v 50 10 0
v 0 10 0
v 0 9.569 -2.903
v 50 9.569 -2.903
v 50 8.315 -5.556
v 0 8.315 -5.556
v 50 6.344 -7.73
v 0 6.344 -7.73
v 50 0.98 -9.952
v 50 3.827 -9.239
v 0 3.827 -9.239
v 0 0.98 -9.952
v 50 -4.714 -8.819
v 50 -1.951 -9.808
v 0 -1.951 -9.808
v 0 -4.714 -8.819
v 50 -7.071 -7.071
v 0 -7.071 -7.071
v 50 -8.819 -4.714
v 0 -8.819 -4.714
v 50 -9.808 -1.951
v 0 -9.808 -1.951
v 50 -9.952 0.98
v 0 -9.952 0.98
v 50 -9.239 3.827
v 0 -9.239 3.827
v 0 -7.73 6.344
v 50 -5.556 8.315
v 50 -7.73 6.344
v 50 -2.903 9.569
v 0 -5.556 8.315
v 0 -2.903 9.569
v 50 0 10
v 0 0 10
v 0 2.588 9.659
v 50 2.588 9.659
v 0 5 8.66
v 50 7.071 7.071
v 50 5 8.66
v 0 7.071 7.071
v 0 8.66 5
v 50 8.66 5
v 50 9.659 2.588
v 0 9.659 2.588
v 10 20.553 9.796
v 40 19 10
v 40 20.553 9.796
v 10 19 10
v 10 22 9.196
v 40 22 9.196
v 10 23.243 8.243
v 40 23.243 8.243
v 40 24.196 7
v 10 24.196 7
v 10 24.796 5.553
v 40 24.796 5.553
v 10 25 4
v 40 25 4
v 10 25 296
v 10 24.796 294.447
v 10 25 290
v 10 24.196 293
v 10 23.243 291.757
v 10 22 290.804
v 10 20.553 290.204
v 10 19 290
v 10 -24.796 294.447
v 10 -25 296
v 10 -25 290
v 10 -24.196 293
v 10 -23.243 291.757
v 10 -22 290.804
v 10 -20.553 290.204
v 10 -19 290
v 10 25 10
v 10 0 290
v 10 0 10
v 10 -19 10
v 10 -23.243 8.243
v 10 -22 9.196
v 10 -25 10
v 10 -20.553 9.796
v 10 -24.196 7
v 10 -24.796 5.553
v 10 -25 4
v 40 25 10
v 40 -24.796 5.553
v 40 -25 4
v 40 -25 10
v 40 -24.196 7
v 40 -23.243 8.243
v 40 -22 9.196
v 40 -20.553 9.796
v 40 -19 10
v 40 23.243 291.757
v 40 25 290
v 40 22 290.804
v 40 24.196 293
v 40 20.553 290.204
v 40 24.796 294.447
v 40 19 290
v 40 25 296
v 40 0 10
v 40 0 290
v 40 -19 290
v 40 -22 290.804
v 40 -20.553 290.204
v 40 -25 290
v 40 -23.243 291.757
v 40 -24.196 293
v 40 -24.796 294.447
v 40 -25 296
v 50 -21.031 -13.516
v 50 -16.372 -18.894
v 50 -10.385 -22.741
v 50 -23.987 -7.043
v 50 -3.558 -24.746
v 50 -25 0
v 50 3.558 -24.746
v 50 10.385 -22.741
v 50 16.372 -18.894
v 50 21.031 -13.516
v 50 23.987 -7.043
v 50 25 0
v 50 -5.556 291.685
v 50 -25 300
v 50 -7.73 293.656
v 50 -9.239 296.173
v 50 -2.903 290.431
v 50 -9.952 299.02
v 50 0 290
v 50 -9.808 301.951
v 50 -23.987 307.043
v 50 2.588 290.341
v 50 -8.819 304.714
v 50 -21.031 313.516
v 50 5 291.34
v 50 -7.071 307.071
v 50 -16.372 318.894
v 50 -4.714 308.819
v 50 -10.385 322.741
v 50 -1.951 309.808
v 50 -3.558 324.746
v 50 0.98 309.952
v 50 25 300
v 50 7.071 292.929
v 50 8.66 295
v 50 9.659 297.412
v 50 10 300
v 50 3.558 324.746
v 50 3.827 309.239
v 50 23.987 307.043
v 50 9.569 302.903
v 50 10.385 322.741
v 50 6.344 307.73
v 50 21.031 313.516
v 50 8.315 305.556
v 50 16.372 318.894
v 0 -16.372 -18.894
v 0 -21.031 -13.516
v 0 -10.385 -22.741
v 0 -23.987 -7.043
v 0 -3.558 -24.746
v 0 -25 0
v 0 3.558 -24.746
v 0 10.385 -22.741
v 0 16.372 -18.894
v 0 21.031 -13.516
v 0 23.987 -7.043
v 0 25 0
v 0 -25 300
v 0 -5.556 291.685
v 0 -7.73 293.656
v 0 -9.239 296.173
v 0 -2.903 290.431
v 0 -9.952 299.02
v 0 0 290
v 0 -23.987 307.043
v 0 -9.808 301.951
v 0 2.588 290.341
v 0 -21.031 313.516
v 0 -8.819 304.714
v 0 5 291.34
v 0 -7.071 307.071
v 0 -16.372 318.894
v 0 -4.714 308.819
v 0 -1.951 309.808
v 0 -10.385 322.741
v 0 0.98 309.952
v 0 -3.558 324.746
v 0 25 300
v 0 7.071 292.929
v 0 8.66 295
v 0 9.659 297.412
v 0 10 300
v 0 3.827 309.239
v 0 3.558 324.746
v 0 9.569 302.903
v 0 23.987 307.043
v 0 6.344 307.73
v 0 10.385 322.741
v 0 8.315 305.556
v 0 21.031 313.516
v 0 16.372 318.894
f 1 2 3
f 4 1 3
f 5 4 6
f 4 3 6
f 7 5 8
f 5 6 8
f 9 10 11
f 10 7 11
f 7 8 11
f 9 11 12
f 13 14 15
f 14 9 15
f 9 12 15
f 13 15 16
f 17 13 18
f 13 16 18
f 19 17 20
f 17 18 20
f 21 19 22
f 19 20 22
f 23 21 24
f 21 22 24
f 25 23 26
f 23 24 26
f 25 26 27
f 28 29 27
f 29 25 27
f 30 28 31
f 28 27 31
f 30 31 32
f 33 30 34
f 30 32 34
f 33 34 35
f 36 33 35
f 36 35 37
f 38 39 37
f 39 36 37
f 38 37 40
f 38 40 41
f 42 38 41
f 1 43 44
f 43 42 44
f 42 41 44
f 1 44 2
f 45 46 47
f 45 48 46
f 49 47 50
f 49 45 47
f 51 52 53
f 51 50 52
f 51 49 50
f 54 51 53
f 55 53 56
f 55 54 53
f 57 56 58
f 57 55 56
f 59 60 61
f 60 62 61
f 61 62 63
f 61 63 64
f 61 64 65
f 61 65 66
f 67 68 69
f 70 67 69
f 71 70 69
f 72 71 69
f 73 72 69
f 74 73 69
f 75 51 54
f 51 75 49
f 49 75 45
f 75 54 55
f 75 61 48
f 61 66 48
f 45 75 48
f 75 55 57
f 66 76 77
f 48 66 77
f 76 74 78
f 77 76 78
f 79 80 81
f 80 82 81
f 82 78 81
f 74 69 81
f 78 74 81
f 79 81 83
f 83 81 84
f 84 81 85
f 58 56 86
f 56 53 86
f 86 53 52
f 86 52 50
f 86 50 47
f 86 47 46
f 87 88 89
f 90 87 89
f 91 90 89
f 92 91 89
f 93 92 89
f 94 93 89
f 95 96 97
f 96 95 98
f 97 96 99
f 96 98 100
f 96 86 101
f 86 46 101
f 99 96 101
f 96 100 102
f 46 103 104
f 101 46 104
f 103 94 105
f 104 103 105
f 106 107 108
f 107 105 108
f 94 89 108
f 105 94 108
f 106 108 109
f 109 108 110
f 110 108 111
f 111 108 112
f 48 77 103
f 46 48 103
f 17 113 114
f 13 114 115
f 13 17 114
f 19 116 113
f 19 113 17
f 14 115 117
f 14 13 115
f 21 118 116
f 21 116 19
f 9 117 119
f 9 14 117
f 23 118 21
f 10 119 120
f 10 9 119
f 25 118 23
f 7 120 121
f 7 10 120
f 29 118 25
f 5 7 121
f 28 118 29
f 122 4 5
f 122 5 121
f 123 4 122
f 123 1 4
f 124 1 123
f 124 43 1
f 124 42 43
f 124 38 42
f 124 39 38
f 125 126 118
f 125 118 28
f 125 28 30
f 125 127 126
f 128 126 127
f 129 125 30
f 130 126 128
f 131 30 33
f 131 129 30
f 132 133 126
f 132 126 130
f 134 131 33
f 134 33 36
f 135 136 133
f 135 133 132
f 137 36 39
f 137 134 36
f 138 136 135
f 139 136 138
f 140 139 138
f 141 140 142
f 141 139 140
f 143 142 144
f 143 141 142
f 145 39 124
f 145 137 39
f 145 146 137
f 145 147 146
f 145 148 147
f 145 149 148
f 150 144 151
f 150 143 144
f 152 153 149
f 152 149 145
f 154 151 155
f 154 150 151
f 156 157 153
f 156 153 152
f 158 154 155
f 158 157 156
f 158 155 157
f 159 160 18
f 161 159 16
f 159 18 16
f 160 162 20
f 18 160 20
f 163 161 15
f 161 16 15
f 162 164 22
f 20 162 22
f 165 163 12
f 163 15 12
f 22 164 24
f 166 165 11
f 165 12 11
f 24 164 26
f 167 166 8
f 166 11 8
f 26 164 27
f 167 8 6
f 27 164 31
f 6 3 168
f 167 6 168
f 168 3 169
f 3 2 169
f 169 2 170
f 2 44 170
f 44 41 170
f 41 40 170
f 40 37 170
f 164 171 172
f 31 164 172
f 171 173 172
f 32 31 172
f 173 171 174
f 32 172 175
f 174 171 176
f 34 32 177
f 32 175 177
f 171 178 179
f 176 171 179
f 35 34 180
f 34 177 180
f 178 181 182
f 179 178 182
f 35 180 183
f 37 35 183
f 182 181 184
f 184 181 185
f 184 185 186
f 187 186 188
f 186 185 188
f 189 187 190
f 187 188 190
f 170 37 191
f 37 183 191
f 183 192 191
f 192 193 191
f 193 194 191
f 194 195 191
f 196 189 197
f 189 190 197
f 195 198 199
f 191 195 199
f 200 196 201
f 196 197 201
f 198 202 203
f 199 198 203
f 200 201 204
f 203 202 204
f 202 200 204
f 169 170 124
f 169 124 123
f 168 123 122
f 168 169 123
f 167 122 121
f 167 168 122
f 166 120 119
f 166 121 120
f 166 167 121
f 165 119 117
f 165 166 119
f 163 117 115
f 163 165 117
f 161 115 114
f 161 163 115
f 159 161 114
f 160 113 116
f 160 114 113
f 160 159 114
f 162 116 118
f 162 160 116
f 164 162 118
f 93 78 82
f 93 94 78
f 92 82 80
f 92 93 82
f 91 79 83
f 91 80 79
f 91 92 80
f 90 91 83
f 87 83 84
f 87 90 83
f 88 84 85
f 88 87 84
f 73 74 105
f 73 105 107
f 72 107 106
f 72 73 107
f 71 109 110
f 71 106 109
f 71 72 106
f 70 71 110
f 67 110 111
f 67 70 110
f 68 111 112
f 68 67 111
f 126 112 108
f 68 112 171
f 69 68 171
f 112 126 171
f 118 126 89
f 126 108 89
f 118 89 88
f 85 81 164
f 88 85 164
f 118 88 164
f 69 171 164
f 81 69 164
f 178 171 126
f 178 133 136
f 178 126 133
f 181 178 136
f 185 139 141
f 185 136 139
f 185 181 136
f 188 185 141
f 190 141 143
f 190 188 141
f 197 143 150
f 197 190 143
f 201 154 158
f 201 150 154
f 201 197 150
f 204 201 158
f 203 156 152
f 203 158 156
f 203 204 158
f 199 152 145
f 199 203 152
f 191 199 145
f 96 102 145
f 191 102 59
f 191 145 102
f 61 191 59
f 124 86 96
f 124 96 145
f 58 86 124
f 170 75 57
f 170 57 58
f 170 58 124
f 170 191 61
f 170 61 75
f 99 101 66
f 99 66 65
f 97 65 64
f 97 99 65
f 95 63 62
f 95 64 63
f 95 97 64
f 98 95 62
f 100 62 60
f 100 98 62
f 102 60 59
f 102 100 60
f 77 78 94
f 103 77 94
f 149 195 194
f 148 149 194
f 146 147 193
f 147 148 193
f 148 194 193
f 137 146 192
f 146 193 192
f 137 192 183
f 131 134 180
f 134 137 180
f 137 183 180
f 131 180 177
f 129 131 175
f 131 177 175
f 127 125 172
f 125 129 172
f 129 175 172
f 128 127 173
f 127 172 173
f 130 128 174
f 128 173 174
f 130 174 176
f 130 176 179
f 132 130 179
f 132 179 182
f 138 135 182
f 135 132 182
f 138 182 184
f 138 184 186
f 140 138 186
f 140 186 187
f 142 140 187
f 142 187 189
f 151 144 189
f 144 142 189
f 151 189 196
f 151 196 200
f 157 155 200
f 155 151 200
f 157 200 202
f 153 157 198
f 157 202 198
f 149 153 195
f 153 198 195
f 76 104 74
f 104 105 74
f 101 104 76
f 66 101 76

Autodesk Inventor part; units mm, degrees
ref_plane "YZ Plane" through (0, 0, 0) normal (1, 0, 0) x (0, 1, 0)
ref_plane "XZ Plane" through (0, 0, 0) normal (0, 1, 0) x (-1, 0, 0)
ref_plane "XY Plane" through (0, 0, 0) normal (0, 0, 1) x (1, 0, 0)
sketch "Sketch1" plane through (0, 0, 0) normal (1, 0, 0) x (0, 1, 0)
  circle A0 centre (0, 0) radius 25
  line L0 (0, 0) -> (0, 300)
  circle A1 centre (0, 300) radius 25
  circle A2 centre (0, 300) radius 10
  circle A3 centre (0, 0) radius 10
  line L1 (25, 300) -> (25, 0)
  line L2 (-25, 300) -> (-25, 0)
  dimension "d0" = 300
  dimension "d1" = 50
  dimension "d2" = 20
extrude "Extrusion1" add sketch "Sketch1" along normal blind 50
sketch "Sketch2" plane through (0, -25, 0) normal (0, -1, 0) x (1, 0, 0)
  line L0 (0, 0) -> (50, 0) projected
  line L1 (50, 300) -> (50, 0) projected
  line L2 (0, 0) -> (50, 0)
  line L3 (50, 0) -> (50, 300)
  line L4 (50, 300) -> (0, 300)
  line L5 (0, 300) -> (0, 0)
  line L6 (10, 10) -> (40, 10)
  line L7 (40, 10) -> (40, 290)
  line L8 (40, 290) -> (10, 290)
  line L9 (10, 290) -> (10, 10)
  dimension "d6" = 10
extrude "Extrusion2" cut sketch "Sketch2" against normal through all contours L9 L8 L7 L6
fillet "Fillet1" radius 6 4 edges at (25, 25, 290) (25, 25, 10) (25, -25, 10) (25, -25, 290)
properties part number "arm1"
